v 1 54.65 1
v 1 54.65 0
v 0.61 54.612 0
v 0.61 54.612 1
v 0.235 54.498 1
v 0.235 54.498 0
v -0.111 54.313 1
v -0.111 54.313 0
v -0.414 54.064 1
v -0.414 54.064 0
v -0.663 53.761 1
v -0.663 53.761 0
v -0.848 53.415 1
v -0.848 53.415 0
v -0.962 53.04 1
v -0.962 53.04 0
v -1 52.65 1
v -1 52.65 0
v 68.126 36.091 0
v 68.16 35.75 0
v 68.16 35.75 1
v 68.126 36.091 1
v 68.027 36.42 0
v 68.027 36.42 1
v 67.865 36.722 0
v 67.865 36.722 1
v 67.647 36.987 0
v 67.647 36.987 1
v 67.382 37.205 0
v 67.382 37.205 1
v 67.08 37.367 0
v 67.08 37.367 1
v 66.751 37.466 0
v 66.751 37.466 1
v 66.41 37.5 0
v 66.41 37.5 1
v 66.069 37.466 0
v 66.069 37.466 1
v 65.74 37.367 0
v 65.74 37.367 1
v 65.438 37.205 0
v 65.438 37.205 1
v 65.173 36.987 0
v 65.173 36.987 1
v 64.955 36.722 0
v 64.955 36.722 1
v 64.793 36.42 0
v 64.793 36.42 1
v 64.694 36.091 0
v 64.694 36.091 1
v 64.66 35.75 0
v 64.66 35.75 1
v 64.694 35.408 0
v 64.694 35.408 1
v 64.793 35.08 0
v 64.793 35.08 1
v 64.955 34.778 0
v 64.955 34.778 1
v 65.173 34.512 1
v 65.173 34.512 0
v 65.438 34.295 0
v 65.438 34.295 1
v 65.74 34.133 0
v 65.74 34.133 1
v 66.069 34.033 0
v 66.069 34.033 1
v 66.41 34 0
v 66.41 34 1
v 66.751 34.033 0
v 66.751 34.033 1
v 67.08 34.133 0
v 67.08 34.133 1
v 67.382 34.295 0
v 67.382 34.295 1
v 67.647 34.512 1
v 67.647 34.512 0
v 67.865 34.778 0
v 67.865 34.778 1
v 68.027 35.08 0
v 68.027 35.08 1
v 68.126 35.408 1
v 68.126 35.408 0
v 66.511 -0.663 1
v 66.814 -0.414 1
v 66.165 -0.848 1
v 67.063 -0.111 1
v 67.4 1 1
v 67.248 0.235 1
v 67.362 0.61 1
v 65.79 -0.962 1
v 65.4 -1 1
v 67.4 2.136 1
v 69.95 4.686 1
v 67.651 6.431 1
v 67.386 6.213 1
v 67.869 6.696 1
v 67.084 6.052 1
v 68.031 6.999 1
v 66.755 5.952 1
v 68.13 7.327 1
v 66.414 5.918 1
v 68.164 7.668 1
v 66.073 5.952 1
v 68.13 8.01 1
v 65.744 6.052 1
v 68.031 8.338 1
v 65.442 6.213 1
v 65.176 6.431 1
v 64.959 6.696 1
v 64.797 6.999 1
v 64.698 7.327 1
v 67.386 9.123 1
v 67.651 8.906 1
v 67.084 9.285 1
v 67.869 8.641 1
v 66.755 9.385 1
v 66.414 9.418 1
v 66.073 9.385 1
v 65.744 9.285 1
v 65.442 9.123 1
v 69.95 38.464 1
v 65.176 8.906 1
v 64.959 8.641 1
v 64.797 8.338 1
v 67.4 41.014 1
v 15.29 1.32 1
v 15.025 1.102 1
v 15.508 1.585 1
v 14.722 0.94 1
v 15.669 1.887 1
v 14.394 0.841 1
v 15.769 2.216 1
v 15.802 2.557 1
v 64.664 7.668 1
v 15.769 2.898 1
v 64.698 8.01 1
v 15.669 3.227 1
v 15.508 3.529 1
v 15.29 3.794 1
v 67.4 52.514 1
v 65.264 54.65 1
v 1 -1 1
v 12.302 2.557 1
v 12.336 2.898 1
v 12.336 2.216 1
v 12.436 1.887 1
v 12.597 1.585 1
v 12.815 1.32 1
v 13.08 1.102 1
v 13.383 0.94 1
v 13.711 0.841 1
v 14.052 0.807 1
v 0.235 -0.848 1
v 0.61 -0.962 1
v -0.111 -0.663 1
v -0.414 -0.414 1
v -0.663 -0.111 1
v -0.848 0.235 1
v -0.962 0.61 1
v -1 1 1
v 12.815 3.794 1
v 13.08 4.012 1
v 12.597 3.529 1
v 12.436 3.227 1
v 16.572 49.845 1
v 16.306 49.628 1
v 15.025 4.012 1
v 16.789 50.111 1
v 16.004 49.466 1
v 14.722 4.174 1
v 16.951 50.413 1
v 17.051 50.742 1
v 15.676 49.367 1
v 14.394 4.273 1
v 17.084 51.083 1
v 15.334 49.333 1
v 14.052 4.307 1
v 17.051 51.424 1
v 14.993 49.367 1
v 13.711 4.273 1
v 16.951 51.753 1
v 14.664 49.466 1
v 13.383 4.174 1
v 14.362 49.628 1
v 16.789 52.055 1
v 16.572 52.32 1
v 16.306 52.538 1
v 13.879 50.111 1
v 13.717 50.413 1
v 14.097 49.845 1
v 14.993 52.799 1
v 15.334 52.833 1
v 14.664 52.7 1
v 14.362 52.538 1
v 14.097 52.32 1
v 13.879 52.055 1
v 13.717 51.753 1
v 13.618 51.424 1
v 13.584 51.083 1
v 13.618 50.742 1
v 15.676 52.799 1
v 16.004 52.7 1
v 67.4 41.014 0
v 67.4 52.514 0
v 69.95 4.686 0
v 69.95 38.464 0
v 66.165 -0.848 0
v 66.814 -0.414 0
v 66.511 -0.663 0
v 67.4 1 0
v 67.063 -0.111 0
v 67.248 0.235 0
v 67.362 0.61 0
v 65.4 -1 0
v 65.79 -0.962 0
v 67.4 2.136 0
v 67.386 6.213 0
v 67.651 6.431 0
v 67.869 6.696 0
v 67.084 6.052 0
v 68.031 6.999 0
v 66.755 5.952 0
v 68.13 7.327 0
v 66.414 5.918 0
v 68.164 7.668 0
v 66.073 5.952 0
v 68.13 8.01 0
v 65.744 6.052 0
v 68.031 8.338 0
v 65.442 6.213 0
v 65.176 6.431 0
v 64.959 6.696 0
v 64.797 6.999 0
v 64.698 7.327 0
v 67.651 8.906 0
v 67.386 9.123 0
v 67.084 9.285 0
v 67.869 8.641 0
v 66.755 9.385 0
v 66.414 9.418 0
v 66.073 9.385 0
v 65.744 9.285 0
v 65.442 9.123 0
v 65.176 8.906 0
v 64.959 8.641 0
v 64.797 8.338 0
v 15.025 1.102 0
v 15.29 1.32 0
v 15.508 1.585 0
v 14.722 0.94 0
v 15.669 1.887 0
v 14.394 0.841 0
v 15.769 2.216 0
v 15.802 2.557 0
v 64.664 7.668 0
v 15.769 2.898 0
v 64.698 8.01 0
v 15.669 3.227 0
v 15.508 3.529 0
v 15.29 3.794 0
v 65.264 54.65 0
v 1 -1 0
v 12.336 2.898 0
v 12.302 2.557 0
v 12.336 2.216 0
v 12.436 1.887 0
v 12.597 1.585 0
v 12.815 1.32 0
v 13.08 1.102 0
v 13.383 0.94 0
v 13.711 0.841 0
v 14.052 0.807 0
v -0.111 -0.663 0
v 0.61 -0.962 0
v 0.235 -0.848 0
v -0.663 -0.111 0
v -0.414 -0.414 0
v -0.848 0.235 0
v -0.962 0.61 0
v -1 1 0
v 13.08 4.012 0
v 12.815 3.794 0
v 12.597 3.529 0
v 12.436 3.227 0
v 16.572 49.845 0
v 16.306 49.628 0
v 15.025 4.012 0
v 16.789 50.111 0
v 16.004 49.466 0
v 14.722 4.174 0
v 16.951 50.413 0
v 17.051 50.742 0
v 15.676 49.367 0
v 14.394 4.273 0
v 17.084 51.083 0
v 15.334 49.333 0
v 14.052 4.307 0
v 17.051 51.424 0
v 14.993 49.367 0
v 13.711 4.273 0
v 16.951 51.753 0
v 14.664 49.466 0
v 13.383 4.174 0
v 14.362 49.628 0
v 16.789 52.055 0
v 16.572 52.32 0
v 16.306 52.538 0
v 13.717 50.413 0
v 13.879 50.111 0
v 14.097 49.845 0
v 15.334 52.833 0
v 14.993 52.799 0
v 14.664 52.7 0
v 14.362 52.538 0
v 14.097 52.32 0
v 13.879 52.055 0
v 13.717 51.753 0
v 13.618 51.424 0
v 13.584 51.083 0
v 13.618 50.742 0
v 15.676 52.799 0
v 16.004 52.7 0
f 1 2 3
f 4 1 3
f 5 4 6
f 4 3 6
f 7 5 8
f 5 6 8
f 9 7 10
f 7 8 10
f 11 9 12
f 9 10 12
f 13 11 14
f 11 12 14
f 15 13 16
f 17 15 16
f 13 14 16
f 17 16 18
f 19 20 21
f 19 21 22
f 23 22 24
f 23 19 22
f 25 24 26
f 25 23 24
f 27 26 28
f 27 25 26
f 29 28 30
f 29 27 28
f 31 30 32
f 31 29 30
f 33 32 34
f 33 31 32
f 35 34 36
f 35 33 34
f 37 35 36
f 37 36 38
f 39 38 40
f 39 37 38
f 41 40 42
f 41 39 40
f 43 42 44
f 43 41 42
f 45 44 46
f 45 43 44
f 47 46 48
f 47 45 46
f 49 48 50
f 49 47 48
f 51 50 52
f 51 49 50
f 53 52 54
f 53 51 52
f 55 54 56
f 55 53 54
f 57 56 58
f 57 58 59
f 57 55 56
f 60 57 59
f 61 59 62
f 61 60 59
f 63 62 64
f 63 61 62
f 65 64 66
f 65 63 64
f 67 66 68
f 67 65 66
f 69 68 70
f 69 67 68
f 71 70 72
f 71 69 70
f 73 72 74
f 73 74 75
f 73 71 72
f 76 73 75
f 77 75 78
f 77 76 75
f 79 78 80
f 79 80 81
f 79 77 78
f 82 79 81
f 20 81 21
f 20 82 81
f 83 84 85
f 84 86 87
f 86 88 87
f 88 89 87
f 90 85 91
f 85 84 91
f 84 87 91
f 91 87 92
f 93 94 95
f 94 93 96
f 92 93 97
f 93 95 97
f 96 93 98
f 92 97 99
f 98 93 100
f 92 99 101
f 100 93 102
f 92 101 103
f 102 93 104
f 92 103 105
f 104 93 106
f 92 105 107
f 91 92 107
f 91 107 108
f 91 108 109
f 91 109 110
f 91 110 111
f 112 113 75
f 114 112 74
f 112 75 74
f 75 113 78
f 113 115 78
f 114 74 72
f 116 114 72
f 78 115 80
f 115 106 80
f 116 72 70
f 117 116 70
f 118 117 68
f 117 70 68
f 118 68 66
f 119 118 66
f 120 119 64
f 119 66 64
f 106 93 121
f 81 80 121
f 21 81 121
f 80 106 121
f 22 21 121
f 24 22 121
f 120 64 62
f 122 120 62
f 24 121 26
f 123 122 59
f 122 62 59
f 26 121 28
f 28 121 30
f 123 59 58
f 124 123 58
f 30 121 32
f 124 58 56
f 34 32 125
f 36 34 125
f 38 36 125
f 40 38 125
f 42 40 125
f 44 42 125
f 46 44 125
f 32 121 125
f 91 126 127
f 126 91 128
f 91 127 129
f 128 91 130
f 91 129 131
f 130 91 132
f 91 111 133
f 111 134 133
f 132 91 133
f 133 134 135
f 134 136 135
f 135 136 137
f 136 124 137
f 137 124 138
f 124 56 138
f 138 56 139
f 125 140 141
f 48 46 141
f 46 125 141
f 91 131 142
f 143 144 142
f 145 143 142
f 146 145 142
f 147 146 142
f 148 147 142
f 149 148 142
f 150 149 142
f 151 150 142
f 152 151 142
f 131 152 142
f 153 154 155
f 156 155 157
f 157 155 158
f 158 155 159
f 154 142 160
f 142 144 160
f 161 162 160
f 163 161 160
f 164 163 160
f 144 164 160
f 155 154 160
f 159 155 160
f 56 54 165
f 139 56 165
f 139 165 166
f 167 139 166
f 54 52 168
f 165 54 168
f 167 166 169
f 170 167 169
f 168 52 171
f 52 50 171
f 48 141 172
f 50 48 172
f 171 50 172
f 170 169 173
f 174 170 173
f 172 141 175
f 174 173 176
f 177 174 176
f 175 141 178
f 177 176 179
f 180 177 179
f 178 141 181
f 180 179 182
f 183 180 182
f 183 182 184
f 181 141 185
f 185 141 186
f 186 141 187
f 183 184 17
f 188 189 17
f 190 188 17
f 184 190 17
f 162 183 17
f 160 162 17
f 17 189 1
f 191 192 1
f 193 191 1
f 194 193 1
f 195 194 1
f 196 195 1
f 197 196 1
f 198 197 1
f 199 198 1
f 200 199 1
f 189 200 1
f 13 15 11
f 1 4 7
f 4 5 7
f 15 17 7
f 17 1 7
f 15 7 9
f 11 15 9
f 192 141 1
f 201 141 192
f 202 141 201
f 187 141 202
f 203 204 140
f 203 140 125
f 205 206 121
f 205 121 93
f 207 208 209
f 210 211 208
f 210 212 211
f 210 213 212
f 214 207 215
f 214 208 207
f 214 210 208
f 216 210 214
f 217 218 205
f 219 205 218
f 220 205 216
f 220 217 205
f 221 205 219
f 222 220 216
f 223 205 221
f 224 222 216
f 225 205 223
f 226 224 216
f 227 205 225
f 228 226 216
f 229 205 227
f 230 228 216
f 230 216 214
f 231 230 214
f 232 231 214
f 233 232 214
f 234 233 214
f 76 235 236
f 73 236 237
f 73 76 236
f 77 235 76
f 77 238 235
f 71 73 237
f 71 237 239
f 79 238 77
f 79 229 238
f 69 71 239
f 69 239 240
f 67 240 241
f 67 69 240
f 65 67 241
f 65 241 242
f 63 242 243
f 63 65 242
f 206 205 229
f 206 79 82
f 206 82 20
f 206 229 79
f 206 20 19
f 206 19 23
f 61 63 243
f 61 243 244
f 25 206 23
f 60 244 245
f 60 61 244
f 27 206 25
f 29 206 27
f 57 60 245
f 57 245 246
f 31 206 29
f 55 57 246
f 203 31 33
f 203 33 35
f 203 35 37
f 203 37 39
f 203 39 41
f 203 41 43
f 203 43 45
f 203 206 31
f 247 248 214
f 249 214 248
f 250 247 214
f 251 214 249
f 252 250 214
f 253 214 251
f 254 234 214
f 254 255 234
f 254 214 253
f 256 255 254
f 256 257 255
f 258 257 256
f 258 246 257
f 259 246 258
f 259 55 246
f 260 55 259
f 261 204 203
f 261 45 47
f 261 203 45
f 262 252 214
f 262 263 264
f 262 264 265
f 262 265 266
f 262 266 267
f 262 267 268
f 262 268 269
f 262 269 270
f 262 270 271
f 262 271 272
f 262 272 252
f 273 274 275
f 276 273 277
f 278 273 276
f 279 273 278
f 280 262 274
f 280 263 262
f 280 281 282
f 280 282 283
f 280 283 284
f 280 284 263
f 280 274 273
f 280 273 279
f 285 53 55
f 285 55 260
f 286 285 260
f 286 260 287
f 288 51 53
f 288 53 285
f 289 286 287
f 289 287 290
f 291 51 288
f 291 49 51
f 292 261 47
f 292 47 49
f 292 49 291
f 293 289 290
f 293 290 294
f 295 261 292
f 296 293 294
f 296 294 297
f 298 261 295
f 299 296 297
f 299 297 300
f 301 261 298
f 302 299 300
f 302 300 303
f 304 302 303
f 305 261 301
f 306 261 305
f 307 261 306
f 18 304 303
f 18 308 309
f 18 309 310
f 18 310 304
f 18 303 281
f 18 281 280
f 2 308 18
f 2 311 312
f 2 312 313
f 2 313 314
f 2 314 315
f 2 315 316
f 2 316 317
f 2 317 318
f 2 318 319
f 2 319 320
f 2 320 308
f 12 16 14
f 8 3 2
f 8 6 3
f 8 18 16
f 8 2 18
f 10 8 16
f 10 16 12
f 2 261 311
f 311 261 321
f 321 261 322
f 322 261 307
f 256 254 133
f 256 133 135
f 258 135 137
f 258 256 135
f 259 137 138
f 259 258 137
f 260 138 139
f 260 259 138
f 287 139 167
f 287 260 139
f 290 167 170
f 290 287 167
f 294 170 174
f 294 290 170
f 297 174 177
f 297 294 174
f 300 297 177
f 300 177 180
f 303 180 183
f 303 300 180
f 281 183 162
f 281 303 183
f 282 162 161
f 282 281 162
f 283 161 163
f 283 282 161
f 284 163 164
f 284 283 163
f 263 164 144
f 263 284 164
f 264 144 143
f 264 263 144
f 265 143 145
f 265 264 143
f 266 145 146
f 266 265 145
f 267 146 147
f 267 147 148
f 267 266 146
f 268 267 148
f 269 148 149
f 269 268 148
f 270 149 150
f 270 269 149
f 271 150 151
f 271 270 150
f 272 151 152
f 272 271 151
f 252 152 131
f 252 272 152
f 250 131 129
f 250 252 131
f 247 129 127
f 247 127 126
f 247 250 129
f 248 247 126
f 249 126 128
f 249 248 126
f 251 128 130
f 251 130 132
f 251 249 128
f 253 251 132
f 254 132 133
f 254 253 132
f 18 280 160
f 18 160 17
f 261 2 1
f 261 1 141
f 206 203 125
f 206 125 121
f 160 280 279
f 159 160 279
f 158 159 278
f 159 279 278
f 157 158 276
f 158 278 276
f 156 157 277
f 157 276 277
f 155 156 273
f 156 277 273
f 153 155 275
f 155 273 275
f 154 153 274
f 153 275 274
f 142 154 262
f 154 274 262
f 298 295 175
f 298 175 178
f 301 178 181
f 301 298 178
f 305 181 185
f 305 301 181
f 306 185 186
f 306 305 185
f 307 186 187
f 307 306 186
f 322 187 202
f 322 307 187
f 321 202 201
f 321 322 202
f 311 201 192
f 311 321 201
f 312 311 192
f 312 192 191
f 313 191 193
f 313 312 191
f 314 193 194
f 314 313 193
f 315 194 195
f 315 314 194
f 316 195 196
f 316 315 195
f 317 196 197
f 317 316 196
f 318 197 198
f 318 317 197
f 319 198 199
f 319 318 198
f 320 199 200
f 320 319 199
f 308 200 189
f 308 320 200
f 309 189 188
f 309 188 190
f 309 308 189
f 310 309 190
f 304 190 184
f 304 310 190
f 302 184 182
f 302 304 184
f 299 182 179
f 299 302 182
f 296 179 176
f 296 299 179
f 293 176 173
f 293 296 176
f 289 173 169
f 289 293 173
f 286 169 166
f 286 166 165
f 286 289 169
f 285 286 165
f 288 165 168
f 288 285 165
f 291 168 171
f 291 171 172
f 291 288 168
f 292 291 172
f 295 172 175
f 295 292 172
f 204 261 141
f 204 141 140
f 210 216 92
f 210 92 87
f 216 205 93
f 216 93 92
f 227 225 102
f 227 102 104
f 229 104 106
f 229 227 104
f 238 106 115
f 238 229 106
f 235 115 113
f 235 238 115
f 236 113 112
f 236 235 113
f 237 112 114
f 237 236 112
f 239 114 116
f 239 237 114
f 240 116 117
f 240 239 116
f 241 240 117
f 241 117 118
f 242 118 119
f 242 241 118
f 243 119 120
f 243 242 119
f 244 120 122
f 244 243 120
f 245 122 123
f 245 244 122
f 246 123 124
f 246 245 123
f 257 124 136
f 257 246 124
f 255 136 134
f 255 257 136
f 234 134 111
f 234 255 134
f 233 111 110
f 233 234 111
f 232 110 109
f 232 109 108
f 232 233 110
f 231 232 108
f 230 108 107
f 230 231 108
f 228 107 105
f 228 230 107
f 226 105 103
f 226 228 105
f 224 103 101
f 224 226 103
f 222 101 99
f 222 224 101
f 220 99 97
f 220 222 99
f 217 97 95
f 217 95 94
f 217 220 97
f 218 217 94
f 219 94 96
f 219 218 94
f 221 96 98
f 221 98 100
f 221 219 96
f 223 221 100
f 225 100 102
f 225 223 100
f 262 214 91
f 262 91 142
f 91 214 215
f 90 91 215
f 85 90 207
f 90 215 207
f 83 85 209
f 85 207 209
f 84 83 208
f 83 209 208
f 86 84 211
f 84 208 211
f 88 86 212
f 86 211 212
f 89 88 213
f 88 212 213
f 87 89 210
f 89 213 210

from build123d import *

# Parameters (mm, degrees)
SKETCH_R      = 1.75
EXTRUDE_DEPTH = 1


with BuildPart() as part:
    # Sketch → Extrude (new body)
    with BuildSketch(Plane.XY):
        with BuildLine():
            Line((65.264214, 54.65), (67.4, 52.514214))
            Line((67.4, 52.514214), (67.4, 41.014214))
            Line((67.4, 41.014214), (69.95, 38.464214))
            Line((69.95, 38.464214), (69.95, 4.685786))
            Line((69.95, 4.685786), (67.4, 2.135786))
            Line((67.4, 2.135786), (67.4, 1))
            ThreePointArc((65.4, -1), (66.814214, -0.414214), (67.4, 1))
            Line((65.4, -1), (1, -1))
            ThreePointArc((-1, 1), (-0.414214, -0.414214), (1, -1))
            Line((-1, 1), (-1, 52.65))
            ThreePointArc((1, 54.65), (-0.414214, 54.064214), (-1, 52.65))
            Line((1, 54.65), (65.264214, 54.65))
        make_face()
        with Locations((14.05247, 2.556984)):
            Circle(SKETCH_R, mode=Mode.SUBTRACT)
        with Locations((66.413926, 7.668398)):
            Circle(SKETCH_R, mode=Mode.SUBTRACT)
        with Locations((66.409951, 35.749834)):
            Circle(SKETCH_R, mode=Mode.SUBTRACT)
        with Locations((15.334135, 51.082933)):
            Circle(SKETCH_R, mode=Mode.SUBTRACT)
    extrude(amount=EXTRUDE_DEPTH)


solid = part.part
